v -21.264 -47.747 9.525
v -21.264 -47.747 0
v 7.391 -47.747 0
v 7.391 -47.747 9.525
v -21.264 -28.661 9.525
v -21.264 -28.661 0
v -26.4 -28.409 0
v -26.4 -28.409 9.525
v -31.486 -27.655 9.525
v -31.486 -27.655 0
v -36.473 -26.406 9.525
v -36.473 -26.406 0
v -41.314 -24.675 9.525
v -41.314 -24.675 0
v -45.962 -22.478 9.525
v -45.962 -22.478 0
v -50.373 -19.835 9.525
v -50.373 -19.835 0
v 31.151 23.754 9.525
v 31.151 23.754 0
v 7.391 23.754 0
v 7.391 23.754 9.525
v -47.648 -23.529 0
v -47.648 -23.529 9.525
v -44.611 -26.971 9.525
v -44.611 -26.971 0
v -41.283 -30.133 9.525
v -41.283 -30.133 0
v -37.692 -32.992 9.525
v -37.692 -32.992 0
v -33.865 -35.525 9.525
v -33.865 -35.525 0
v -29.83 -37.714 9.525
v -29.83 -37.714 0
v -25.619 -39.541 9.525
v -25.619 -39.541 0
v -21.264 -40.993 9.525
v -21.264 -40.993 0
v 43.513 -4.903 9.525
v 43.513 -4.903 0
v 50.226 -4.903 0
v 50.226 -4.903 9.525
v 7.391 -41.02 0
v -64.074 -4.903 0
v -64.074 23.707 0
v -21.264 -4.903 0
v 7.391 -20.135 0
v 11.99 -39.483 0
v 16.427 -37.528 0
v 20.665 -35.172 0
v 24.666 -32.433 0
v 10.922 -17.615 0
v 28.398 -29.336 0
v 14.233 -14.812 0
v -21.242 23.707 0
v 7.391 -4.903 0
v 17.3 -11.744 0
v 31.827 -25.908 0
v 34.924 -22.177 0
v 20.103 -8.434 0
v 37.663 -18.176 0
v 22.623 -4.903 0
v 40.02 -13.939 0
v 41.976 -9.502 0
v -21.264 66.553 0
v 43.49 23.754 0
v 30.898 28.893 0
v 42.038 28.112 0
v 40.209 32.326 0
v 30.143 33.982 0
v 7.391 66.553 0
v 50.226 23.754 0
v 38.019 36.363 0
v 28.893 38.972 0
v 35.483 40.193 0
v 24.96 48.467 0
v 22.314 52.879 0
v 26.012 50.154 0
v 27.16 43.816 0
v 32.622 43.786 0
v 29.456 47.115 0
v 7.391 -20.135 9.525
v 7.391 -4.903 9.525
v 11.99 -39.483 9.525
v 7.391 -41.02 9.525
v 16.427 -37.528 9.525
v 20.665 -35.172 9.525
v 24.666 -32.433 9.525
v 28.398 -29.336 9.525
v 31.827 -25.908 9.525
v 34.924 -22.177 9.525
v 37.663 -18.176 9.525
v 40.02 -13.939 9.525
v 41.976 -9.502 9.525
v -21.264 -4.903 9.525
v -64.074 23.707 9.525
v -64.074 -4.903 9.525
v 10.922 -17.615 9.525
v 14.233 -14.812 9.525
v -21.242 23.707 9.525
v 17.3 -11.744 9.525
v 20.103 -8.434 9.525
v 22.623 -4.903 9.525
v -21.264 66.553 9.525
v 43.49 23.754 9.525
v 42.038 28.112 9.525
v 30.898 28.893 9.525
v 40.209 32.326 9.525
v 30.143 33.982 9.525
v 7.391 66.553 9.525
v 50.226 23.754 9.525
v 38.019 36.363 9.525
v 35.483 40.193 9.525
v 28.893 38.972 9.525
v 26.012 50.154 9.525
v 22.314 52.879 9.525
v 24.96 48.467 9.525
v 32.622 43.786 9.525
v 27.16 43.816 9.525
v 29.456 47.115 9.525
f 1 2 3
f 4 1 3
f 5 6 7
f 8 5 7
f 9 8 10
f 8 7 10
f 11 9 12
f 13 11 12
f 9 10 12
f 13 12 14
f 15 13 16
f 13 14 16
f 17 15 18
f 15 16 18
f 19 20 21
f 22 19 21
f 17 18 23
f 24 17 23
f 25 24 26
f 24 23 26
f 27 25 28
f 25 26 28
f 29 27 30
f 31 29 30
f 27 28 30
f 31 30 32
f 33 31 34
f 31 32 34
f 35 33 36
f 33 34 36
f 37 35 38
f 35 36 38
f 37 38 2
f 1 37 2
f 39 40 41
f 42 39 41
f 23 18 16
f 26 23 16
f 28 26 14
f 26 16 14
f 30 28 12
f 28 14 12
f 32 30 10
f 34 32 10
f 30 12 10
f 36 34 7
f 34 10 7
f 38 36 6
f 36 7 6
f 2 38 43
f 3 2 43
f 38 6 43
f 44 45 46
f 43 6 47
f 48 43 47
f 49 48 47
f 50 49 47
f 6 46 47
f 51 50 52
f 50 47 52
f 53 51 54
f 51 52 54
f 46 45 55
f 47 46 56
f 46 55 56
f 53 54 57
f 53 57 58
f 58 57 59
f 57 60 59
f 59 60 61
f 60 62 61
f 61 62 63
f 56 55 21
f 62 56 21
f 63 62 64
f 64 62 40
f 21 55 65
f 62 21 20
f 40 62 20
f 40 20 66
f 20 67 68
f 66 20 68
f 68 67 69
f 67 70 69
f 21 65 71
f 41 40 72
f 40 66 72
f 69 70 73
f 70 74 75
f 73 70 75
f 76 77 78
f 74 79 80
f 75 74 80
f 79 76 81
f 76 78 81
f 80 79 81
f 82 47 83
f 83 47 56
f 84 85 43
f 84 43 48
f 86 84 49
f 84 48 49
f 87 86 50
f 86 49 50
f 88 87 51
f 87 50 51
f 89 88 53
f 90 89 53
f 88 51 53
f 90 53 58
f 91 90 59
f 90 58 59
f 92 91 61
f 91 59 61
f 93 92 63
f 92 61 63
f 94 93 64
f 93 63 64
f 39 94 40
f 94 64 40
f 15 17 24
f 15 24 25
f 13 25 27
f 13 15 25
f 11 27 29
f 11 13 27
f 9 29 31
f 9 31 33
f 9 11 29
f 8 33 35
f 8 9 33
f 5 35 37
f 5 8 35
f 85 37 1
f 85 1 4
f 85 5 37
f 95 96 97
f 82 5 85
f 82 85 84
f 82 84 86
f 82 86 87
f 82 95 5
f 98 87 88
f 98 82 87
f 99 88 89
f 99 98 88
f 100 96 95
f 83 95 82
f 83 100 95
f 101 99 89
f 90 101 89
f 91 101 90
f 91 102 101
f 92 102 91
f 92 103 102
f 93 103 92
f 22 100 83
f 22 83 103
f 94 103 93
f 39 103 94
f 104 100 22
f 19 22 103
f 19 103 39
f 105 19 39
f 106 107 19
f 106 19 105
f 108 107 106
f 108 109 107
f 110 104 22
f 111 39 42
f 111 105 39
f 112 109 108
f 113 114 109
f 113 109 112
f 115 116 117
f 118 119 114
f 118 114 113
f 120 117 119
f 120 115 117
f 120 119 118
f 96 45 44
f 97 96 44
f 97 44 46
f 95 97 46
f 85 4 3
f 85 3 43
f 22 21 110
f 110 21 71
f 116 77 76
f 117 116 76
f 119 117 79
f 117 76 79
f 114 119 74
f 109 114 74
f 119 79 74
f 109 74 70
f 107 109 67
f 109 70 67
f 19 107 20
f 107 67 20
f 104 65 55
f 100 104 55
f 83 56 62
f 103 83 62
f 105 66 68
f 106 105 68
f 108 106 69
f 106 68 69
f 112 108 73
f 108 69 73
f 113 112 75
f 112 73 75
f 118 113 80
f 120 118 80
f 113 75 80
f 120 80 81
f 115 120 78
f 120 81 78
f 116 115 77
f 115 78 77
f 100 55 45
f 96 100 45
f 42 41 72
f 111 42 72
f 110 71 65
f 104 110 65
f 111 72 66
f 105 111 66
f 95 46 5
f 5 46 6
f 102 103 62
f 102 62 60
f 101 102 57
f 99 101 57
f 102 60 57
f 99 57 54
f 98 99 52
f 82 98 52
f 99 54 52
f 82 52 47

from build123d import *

# Parameters (mm, degrees)
F1_DEPTH = 9.525


with BuildPart() as f1:
    # F0 (on Top) → F1 (new body)
    with BuildSketch(Plane.XY):
        with BuildLine():
            ThreePointArc((-21.264499, -28.660992), (-36.472978, -26.406095), (-50.372925, -19.835413))
            ThreePointArc((-50.372925, -19.835413), (-37.692308, -32.991899), (-21.264499, -40.993041))
            Line((-21.264499, -40.993041), (-21.264499, -47.747492))
            Line((-21.264499, -47.747492), (7.390787, -47.747492))
            Line((7.390787, -47.747492), (7.390787, -41.019611))
            ThreePointArc((7.390787, -41.019611), (30.151885, -27.661847), (43.512857, -4.902632))
            Line((43.512857, -4.902632), (50.226257, -4.902632))
            Line((50.226257, -4.902632), (50.226257, 23.754346))
            Line((50.226257, 23.754346), (43.489843, 23.754346))
            ThreePointArc((43.489843, 23.754346), (35.483013, 40.193269), (22.314296, 52.879184))
            ThreePointArc((22.314296, 52.879184), (28.893077, 38.972268), (31.150838, 23.754346))
            Line((31.150838, 23.754346), (7.390787, 23.754346))
            Line((7.390787, 23.754346), (7.390787, 66.552508))
            Line((7.390787, 66.552508), (-21.264499, 66.552508))
            Line((-21.264499, 66.552508), (-21.241715, 23.707046))
            Line((-21.241715, 23.707046), (-64.073743, 23.707046))
            Line((-64.073743, 23.707046), (-64.073743, -4.902632))
            Line((-64.073743, -4.902632), (-21.264499, -4.902632))
            Line((-21.264499, -4.902632), (-21.264499, -28.660992))
        make_face()
        with BuildLine():
            Line((7.390787, -20.13463), (7.390787, -4.902632))
            Line((7.390787, -4.902632), (22.623372, -4.902632))
            ThreePointArc((22.623372, -4.902632), (15.798027, -13.309609), (7.390787, -20.13463))
        make_face(mode=Mode.SUBTRACT)
    extrude(amount=F1_DEPTH)


solid = f1.part
